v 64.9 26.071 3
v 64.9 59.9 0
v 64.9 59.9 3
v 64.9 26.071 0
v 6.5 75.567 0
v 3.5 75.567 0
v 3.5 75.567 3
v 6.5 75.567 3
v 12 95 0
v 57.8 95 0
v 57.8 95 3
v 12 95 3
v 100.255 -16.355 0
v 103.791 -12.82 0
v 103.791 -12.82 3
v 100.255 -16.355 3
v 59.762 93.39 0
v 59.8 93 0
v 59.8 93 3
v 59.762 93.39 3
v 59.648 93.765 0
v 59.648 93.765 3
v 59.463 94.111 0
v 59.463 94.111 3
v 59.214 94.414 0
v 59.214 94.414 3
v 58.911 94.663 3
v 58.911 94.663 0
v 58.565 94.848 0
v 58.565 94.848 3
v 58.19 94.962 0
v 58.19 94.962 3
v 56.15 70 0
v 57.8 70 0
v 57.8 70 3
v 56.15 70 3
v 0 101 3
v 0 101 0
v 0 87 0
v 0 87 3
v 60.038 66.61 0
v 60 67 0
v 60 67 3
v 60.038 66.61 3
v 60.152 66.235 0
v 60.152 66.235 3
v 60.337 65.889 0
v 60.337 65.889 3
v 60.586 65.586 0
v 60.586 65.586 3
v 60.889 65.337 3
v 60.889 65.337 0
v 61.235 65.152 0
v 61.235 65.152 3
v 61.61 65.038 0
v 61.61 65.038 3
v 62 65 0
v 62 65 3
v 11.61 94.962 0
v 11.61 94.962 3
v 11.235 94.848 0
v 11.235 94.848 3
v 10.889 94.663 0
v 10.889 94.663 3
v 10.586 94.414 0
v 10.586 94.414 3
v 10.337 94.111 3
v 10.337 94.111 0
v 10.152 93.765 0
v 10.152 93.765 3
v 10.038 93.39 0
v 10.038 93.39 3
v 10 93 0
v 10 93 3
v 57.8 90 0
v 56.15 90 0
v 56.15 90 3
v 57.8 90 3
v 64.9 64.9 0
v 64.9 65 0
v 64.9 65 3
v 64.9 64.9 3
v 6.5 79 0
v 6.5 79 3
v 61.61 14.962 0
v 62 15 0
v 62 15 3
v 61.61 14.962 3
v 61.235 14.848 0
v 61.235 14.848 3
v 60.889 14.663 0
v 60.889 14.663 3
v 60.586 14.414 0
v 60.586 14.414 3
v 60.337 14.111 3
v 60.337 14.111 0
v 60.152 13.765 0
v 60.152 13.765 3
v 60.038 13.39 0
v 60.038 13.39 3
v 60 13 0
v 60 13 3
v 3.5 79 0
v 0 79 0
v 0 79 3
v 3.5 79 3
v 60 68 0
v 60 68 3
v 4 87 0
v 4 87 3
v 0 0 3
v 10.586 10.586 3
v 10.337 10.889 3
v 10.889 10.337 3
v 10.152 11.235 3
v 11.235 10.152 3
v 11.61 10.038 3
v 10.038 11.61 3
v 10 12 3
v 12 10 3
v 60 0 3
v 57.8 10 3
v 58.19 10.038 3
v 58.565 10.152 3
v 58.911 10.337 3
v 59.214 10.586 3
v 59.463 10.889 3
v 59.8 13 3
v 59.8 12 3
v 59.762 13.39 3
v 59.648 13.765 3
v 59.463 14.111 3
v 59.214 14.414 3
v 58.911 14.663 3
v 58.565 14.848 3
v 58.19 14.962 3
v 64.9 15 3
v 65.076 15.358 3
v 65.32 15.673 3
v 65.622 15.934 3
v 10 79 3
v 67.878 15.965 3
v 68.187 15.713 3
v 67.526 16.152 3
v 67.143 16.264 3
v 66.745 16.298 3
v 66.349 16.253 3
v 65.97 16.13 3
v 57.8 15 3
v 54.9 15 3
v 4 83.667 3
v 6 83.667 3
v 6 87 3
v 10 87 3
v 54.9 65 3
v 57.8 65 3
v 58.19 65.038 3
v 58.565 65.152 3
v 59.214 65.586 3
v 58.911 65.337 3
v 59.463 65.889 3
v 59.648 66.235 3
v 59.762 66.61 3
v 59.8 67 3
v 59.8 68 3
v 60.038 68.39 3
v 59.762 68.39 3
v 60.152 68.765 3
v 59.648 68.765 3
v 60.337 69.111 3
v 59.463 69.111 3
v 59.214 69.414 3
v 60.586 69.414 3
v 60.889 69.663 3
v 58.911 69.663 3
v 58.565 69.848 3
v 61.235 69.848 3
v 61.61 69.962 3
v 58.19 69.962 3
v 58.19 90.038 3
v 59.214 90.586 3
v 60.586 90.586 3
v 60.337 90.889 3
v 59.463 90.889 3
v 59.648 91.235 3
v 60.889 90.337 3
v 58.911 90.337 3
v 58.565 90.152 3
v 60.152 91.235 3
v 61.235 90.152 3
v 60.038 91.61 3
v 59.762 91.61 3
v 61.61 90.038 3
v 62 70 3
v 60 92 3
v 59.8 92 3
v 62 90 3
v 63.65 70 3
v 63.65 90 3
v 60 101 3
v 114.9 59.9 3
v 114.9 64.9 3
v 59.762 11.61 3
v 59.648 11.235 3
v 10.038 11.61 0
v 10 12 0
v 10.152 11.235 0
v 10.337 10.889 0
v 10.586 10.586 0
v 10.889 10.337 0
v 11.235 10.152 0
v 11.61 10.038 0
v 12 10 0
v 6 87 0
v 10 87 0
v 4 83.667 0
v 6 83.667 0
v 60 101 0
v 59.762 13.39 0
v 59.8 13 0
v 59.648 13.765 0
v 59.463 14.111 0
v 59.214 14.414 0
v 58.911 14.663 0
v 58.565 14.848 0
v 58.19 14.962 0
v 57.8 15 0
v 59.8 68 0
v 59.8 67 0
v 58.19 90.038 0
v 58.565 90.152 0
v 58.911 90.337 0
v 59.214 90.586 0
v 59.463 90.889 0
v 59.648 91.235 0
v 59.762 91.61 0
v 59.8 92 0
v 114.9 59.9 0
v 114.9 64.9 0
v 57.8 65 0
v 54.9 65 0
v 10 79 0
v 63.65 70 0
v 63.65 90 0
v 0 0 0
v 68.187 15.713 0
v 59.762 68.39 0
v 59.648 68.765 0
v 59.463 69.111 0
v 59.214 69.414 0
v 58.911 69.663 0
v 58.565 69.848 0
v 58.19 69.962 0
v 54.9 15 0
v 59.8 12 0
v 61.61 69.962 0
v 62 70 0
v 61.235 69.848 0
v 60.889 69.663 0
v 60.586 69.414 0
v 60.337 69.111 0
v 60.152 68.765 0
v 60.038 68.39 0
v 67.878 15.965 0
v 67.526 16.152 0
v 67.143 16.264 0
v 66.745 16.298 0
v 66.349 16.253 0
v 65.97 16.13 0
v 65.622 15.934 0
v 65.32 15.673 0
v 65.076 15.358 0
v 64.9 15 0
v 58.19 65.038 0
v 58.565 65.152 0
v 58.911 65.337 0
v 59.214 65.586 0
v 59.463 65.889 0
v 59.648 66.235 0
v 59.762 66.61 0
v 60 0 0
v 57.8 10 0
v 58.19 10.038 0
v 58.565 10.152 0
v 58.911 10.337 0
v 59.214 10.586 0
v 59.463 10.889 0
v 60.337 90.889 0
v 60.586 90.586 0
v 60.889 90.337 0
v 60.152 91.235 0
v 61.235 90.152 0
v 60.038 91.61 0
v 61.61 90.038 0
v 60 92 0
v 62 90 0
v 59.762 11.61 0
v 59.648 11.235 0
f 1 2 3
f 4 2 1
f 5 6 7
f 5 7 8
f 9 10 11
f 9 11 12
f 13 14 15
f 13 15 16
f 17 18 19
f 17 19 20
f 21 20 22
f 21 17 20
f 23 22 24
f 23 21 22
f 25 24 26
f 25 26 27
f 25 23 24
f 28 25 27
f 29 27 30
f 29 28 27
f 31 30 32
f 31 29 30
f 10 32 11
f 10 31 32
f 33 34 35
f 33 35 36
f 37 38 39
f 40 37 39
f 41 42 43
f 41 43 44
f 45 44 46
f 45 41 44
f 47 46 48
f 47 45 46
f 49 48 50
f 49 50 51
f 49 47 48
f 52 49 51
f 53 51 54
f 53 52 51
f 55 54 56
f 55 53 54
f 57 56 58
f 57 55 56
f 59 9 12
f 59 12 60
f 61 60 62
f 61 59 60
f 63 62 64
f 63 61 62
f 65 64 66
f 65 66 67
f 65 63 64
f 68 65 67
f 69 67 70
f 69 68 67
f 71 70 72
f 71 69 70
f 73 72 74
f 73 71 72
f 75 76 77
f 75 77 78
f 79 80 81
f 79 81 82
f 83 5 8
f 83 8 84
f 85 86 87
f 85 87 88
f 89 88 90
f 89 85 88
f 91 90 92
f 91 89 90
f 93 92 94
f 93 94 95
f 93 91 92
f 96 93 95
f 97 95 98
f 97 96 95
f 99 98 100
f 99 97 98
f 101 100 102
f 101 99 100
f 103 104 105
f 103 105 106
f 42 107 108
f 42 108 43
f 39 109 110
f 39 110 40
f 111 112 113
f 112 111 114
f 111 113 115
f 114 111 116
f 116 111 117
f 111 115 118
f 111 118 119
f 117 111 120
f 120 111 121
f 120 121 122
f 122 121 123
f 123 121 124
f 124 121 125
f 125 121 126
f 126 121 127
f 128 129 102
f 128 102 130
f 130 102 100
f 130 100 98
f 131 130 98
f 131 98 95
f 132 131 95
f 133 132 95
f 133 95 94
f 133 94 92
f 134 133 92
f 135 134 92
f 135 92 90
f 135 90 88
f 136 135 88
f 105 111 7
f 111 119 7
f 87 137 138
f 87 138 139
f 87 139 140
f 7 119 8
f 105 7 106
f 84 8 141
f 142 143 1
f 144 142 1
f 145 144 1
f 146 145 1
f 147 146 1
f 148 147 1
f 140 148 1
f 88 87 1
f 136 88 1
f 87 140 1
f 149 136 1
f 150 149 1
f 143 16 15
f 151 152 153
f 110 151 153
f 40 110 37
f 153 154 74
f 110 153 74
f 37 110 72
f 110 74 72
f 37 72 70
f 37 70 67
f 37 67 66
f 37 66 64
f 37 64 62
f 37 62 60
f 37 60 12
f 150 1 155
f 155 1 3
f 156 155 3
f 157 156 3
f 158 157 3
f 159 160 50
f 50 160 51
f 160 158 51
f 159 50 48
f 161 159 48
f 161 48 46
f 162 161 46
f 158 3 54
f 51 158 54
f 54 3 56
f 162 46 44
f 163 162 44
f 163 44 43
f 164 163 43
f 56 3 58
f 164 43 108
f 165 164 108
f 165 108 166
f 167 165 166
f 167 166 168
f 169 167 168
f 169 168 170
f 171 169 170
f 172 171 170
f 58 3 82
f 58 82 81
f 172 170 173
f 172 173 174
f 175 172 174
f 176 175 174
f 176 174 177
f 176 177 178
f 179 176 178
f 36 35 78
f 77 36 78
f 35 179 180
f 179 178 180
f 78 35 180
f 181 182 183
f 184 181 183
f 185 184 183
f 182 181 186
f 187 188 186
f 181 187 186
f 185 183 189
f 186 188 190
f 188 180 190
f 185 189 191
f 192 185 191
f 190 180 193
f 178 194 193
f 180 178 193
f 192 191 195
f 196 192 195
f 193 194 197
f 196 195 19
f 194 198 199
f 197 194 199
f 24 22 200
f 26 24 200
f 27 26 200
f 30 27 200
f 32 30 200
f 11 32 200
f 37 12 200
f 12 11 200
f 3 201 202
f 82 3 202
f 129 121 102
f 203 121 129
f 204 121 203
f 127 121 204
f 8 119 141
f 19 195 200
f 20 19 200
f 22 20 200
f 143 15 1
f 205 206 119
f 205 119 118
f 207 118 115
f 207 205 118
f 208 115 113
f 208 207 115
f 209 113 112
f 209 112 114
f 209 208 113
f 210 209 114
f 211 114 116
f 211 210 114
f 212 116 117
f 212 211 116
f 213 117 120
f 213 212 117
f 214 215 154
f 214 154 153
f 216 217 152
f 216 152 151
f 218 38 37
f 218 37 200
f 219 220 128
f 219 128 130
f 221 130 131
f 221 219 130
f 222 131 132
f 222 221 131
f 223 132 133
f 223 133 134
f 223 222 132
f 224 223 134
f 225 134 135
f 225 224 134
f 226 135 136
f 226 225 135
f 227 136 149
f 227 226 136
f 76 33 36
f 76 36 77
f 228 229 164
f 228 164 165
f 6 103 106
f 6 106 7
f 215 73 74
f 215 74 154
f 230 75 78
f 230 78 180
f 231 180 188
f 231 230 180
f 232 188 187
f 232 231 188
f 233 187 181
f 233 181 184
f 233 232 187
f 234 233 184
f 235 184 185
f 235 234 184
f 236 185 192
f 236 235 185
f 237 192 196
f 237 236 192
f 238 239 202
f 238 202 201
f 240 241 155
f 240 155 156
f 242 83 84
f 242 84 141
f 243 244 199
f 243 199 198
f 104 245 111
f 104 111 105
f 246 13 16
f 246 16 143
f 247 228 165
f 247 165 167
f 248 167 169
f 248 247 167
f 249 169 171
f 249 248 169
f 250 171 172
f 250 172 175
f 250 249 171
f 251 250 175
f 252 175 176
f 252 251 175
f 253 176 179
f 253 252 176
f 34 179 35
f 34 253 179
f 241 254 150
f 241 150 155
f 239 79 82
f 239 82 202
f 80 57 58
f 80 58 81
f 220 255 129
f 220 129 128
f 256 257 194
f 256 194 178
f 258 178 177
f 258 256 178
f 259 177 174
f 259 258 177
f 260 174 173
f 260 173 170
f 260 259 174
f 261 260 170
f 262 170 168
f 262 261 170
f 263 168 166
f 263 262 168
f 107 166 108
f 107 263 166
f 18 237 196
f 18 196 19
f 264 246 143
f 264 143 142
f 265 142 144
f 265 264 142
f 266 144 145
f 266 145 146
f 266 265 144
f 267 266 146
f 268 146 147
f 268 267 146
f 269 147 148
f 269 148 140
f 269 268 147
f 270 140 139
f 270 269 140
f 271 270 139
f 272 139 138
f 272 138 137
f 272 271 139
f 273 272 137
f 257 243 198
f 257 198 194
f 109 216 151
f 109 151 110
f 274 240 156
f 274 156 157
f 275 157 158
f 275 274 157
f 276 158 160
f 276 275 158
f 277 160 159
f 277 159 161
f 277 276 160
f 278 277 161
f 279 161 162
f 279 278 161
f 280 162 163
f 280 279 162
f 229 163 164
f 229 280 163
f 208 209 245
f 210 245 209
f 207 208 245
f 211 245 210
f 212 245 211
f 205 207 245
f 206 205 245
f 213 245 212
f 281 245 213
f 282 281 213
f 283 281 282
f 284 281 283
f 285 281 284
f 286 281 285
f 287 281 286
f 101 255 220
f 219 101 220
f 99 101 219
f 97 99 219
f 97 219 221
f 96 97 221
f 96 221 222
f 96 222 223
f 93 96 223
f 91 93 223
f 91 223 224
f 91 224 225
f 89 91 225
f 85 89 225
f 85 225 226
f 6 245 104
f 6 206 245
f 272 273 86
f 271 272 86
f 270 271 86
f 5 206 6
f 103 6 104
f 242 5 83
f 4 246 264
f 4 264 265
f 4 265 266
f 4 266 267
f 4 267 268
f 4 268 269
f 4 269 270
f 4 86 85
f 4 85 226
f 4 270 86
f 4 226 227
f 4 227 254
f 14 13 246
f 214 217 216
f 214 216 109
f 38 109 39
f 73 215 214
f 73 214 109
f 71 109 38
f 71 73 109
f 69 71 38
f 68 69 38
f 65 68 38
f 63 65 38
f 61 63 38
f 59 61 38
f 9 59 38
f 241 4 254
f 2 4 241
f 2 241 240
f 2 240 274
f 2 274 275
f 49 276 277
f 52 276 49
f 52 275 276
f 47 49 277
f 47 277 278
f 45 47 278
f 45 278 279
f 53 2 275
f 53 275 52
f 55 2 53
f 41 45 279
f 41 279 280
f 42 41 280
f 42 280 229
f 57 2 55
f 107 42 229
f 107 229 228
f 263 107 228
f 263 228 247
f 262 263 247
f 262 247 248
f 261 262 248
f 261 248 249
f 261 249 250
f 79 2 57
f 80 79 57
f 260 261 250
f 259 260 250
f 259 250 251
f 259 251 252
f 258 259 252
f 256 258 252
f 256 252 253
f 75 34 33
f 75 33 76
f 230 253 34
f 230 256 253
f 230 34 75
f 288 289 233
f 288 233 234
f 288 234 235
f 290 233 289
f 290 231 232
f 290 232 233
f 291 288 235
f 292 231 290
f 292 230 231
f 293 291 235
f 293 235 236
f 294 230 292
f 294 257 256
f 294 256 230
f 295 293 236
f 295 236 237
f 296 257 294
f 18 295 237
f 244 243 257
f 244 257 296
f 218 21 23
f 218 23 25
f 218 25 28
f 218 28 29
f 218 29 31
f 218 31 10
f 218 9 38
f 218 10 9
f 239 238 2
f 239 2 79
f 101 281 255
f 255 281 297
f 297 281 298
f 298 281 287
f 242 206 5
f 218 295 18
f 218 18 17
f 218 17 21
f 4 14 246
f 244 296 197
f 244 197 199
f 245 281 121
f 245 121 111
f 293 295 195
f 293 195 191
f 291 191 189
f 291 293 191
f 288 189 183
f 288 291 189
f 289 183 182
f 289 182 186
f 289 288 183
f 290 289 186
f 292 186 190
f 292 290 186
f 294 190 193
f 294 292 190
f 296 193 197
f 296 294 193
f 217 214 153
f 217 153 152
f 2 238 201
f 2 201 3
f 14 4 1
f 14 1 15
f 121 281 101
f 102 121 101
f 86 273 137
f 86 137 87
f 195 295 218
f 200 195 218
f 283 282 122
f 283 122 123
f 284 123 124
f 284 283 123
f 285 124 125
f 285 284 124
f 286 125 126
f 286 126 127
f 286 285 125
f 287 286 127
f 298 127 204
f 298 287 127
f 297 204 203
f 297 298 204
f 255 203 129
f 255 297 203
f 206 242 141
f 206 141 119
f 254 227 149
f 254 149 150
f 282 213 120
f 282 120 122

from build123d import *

# Parameters (mm, degrees)
BOSS_EXTRUDE1_DEPTH = 3
FILLET1_R           = 2


with BuildPart() as part:
    # Sketch2 → Boss-Extrude1 (new body)
    with BuildSketch(Plane.XY):
        Polygon((0, 0), (0, 79), (3.5, 79), (3.5, 75.566666667), (6.5, 75.566666667), (6.5, 79), (10, 79), (10, 10), (59.8, 10), (59.8, 15), (54.9, 15), (54.9, 65), (59.8, 65), (59.8, 70), (56.15, 70), (56.15, 90), (59.8, 90), (59.8, 95), (10, 95), (10, 87), (6, 87), (6, 83.666666667), (4, 83.666666667), (4, 87), (0, 87), (0, 91), (0, 101), (60, 101), (60, 95), (60, 90), (63.65, 90), (63.65, 70), (60, 70), (60, 65), (64.9, 65), (64.9, 64.9), (114.9, 64.9), (114.9, 59.9), (64.9, 59.9), (64.9, 26.071055471), (103.790928501, -12.819737276), (100.255400766, -16.355277353), (64.9, 19), (64.9, 15), (60, 15), (60, 10), (60, 0), align=None)
    extrude(amount=BOSS_EXTRUDE1_DEPTH)

    # Fillet1
    # the kernel refuses this fillet: 2 mm, written as the material it adds along each edge
    with BuildSketch(Plane(origin=(59.8, 15, 0), x_dir=(-1, 0, 0), z_dir=(0, 0, 1)), Plane(origin=(60, 15, 0), x_dir=(0, -1, 0), z_dir=(0, 0, 1)), Plane(origin=(60, 70, 0), x_dir=(0, -1, 0), z_dir=(0, 0, 1)), Plane(origin=(60, 65, 0), x_dir=(1, 0, 0), z_dir=(0, 0, 1)), Plane(origin=(59.8, 65, 0), x_dir=(0, 1, 0), z_dir=(0, 0, 1)), Plane(origin=(59.8, 70, 0), x_dir=(-1, 0, 0), z_dir=(0, 0, 1)), Plane(origin=(59.8, 95, 0), x_dir=(-1, 0, 0), z_dir=(0, 0, 1)), Plane(origin=(60, 90, 0), x_dir=(1, 0, 0), z_dir=(0, 0, 1)), Plane(origin=(59.8, 90, 0), x_dir=(0, 1, 0), z_dir=(0, 0, 1)), Plane(origin=(10, 10, 0), x_dir=(1, 0, 0), z_dir=(0, 0, 1)), Plane(origin=(10, 95, 0), x_dir=(0, -1, 0), z_dir=(0, 0, 1)), Plane(origin=(59.8, 10, 0), x_dir=(0, 1, 0), z_dir=(0, 0, 1))) as fillet1_piece_1:
        with BuildLine():
            CenterArc((FILLET1_R, FILLET1_R), FILLET1_R, 180, 90)
            Line((0, FILLET1_R), (-FILLET1_R * 0.02, FILLET1_R))
            Line((-FILLET1_R * 0.02, FILLET1_R), (-FILLET1_R * 0.02, -FILLET1_R * 0.02))
            Line((-FILLET1_R * 0.02, -FILLET1_R * 0.02), (FILLET1_R, -FILLET1_R * 0.02))
            Line((FILLET1_R, -FILLET1_R * 0.02), (FILLET1_R, 0))
        make_face()
    extrude(amount=3)
    with BuildSketch(Plane(origin=(64.9, 19, 0), x_dir=(0, -1, 0), z_dir=(0, 0, 1))) as fillet1_piece_2:
        with BuildLine():
            CenterArc((4.70139372, 1.87297807), FILLET1_R, 135.0001, 114.469955898)
            Line((3.287177689, 3.287189164), (3.258893369, 3.315473386))
            Line((3.258893369, 3.315473386), (-0.028284321, 0.028284222))
            Line((-0.028284321, 0.028284222), (0, -0.04))
            ThreePointArc((0, -0.04), (2, -0.04), (3.985972126, -0.037459561))
            Line((3.985972126, -0.037459561), (4, 0))
        make_face()
    extrude(amount=3)


solid = part.part
